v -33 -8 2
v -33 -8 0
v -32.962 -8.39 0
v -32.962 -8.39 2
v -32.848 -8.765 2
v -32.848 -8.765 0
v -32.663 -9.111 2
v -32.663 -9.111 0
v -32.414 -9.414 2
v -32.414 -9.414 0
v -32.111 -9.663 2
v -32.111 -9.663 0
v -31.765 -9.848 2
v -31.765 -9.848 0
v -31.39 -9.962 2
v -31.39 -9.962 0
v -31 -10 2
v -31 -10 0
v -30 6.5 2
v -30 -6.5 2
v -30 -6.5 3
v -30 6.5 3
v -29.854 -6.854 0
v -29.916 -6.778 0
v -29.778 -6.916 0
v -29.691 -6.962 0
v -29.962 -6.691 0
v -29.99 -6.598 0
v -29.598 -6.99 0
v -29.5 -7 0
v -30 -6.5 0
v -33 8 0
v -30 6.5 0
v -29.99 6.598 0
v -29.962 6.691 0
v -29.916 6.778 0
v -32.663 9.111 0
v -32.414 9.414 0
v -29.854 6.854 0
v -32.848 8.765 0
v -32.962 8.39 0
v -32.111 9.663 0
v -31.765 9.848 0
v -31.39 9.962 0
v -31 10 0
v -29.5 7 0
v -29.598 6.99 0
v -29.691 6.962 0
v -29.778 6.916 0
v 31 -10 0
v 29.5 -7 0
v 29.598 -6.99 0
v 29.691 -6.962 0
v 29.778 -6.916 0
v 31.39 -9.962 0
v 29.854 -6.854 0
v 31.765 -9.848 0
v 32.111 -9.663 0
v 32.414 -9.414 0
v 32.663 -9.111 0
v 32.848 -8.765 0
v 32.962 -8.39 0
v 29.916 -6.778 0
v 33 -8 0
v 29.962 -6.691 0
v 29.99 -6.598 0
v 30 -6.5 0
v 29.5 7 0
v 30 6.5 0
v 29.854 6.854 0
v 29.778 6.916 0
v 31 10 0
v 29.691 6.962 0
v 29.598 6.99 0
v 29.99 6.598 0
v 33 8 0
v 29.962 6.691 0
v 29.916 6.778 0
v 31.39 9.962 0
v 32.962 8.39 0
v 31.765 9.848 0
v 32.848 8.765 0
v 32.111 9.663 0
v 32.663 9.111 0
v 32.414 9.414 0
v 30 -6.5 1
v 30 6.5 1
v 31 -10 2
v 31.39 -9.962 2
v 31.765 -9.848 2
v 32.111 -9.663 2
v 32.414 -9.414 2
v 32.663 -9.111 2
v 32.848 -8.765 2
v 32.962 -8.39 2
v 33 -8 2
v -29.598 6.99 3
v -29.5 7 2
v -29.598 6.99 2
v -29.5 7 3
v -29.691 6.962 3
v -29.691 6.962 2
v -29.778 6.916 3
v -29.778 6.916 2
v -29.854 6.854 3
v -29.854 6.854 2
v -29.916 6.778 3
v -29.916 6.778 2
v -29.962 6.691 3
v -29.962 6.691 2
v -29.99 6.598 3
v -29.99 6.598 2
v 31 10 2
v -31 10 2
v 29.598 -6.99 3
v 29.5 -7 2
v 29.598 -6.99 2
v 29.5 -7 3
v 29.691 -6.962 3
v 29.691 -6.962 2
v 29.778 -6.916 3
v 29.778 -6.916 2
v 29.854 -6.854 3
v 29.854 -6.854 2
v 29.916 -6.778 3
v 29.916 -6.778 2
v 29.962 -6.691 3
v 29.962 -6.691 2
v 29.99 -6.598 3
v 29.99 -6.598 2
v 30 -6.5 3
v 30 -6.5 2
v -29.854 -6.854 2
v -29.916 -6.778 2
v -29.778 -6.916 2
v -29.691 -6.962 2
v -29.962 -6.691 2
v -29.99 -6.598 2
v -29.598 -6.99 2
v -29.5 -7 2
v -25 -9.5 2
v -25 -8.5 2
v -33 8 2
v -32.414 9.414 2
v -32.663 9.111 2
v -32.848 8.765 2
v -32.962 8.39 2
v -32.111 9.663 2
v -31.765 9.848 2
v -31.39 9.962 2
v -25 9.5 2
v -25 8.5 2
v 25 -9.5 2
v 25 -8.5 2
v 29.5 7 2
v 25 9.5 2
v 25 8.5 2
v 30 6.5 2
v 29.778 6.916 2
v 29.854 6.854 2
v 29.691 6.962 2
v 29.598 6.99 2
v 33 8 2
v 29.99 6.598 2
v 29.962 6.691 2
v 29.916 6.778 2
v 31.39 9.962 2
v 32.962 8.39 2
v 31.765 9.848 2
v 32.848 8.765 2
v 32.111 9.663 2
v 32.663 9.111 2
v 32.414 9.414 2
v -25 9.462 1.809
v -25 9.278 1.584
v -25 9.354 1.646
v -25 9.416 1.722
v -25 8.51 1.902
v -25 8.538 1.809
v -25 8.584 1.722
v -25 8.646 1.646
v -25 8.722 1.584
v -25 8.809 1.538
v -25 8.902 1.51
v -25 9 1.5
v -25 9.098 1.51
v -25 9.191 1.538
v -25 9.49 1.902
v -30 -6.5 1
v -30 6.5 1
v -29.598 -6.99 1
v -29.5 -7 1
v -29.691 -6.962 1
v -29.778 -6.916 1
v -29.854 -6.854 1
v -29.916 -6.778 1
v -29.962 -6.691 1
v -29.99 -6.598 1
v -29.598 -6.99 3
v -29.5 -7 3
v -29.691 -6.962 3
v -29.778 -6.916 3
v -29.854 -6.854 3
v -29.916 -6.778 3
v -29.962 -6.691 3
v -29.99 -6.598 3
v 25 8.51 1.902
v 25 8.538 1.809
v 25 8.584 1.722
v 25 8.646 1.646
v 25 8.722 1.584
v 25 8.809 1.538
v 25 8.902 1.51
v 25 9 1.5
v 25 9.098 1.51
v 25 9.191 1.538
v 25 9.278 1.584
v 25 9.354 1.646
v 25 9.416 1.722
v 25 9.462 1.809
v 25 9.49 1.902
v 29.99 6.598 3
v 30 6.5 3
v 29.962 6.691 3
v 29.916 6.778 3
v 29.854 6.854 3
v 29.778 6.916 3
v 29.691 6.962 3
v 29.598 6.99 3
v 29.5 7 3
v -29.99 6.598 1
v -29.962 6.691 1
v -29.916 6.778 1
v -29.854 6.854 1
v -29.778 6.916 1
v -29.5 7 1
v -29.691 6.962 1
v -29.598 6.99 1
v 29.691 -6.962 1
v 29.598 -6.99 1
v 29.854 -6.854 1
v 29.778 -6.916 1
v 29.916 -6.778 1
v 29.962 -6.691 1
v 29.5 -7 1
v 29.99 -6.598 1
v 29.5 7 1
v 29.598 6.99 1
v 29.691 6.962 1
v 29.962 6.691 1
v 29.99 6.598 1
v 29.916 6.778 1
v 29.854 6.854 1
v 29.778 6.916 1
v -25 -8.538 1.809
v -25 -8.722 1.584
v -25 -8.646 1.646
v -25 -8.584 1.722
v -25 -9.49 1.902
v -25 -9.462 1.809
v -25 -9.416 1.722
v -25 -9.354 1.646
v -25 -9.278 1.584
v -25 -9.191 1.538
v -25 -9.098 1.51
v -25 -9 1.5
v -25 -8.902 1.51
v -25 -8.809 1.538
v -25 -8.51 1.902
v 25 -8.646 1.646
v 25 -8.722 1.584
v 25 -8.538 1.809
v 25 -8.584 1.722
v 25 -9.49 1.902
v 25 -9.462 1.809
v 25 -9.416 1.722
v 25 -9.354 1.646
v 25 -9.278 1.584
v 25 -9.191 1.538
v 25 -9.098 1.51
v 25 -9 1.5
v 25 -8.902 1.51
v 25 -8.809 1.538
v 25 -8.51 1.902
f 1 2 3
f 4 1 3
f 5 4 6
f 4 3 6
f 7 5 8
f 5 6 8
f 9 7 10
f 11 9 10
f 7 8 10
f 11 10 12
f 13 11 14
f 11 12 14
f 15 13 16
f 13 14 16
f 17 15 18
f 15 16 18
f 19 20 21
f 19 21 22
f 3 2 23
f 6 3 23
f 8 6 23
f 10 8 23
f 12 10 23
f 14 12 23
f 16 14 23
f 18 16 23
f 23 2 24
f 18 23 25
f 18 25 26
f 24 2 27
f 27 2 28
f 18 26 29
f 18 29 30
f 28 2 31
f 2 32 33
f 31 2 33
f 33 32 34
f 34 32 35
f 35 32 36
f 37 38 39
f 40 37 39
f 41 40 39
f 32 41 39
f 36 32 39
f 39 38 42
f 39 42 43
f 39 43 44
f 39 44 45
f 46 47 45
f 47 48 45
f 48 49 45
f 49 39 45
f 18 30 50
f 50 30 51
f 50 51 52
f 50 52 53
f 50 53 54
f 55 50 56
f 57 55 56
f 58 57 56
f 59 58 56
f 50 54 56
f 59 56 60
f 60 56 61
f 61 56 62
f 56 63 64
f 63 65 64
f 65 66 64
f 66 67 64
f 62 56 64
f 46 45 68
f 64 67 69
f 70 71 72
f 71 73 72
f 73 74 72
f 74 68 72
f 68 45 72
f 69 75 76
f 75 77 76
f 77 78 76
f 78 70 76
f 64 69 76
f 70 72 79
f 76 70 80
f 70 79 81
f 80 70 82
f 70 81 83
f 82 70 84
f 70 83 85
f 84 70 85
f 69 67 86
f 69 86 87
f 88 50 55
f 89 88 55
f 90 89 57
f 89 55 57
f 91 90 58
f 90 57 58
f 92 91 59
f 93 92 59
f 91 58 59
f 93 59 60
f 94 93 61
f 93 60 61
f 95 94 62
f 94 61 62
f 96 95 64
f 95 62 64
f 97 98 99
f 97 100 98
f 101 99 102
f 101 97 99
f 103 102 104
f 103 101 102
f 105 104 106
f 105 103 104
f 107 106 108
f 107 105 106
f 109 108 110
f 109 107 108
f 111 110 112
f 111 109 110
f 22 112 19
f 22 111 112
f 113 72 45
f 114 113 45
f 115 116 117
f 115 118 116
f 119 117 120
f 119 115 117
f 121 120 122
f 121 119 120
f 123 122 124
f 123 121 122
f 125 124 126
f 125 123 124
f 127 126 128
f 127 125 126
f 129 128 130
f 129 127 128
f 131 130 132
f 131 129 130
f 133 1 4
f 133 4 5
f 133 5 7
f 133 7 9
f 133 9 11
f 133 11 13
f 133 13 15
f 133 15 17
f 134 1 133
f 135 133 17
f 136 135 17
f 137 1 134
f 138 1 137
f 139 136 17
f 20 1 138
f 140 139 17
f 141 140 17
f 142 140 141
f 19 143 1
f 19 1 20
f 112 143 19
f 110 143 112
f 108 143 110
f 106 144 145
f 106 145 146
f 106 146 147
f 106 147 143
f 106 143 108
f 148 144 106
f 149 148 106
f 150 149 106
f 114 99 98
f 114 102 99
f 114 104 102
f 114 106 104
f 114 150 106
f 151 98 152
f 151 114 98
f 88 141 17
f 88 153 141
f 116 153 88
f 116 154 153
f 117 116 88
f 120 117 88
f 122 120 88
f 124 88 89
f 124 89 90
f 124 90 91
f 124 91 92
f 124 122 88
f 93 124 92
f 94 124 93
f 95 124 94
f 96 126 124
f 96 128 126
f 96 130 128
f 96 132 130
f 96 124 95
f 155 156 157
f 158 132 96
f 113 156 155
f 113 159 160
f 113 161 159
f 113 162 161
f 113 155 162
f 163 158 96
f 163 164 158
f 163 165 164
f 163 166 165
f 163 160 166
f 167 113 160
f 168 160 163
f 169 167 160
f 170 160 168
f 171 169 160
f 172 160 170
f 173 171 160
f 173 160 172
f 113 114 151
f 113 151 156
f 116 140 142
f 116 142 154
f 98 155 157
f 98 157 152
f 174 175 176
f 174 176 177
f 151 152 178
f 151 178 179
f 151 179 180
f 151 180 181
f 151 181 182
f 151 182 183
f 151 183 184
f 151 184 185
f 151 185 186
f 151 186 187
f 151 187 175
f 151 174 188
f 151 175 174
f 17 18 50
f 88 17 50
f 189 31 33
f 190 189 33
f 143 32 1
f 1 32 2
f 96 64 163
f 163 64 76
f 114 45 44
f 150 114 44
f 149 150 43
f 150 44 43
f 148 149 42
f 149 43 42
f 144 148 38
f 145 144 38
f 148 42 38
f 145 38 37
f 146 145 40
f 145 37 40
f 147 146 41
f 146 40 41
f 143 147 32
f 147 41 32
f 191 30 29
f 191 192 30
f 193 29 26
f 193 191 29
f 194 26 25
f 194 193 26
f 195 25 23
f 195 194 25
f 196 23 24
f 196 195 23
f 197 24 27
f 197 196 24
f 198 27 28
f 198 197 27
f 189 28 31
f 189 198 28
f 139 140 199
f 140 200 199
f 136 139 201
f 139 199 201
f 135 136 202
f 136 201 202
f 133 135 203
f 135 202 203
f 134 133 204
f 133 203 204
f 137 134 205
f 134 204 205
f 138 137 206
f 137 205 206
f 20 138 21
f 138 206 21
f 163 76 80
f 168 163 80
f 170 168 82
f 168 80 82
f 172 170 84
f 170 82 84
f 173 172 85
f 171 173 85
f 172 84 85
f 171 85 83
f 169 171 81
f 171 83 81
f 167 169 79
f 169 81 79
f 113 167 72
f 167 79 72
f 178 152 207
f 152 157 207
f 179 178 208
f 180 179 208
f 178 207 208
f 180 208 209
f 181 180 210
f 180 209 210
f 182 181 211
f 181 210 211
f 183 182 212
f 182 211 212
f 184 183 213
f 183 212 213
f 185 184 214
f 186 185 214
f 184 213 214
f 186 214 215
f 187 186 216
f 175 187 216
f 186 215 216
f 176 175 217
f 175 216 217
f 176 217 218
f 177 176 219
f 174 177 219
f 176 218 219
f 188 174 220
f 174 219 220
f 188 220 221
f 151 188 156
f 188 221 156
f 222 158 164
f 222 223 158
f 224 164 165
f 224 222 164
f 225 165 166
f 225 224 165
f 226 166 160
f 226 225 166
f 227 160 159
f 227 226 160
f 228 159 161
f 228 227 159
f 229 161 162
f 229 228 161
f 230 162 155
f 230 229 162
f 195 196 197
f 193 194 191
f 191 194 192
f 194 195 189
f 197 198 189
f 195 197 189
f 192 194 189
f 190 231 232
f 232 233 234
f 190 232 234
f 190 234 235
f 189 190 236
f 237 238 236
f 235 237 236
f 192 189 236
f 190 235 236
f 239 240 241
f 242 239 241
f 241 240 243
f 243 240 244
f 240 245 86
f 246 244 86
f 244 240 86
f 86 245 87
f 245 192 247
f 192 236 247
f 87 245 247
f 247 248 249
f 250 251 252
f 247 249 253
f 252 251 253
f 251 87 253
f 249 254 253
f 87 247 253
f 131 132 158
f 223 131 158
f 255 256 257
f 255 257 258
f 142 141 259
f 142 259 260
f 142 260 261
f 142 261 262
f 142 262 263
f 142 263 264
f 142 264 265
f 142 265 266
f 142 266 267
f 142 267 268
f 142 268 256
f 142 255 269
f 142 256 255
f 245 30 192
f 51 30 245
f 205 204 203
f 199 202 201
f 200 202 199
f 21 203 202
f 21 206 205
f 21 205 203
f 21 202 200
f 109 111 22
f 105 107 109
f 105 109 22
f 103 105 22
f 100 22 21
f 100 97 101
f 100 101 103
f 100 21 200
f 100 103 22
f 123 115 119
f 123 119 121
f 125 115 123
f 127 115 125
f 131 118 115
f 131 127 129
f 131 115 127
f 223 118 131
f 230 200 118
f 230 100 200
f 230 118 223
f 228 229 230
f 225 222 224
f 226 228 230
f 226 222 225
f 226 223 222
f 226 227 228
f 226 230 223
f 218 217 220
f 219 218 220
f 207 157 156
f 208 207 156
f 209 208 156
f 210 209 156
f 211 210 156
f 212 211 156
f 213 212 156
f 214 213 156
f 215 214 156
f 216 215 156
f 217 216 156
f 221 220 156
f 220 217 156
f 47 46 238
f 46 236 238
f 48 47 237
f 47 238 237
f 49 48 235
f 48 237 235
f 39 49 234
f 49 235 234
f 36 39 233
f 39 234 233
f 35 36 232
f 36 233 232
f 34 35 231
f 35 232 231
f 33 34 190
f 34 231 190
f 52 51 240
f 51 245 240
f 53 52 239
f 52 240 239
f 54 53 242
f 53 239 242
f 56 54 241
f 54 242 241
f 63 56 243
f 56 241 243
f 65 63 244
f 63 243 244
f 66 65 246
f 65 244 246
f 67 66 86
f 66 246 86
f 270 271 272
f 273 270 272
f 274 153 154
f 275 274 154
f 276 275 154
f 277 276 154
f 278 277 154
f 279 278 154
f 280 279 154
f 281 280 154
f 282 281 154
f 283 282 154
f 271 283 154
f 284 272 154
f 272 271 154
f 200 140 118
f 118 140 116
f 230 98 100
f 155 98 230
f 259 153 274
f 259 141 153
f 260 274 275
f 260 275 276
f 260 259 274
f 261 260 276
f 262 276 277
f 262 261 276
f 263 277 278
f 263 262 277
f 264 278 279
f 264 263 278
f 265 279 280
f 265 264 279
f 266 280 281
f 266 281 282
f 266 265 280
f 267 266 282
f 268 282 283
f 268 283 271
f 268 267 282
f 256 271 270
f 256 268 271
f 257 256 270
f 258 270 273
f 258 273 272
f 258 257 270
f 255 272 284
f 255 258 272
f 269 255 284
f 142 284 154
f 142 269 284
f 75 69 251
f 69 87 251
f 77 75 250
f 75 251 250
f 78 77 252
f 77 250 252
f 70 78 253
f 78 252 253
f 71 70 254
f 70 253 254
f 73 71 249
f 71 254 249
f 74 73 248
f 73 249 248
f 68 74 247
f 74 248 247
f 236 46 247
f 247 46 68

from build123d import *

# Parameters (mm, degrees)
F0_W          = 60
F0_H          = 14
F1_DEPTH      = 2
F2_W          = 60
F2_H          = 14
F3_DEPTH      = 1
F3_DEPTH_BACK = 1
F4_R          = 0.5
F6_DEPTH      = 25
F7_R          = 0.5


with BuildPart() as f1:
    # F0 (on Top) → F1 (new body)
    with BuildSketch(Plane.XY):
        with BuildLine():
            Line((31, 10), (-31, 10))
            ThreePointArc((-31, 10), (-32.4142135624, 9.4142135624), (-33, 8))
            Line((-33, 8), (-33, -8))
            ThreePointArc((-33, -8), (-32.4142135624, -9.4142135624), (-31, -10))
            Line((-31, -10), (31, -10))
            ThreePointArc((31, -10), (32.4142135624, -9.4142135624), (33, -8))
            Line((33, -8), (33, 8))
            ThreePointArc((33, 8), (32.4142135624, 9.4142135624), (31, 10))
        make_face()
        Rectangle(F0_W, F0_H, mode=Mode.SUBTRACT)
    extrude(amount=F1_DEPTH)

    # F2 (on face) → F3 (join, two sides)
    with BuildSketch(Plane.XY.offset(2)) as f3_sk:
        Rectangle(F2_W, F2_H)
    extrude(amount=F3_DEPTH)
    extrude(f3_sk.sketch, amount=-F3_DEPTH_BACK)

    # F4
    f4_edges = [f1.edges().sort_by_distance(p)[0] for p in [
        (-30, 7, 2.5),
        (-30, -7, 2.5),
        (30, -7, 2.5),
        (30, 7, 2.5),
    ]]
    fillet(f4_edges, radius=F4_R)

    # F5 (on Right) → F6 (cut, symmetric)
    with BuildSketch(Plane.YZ):
        with BuildLine():
            Line((-8.5, 2), (-9.5, 2))
            ThreePointArc((-9.5, 2), (-9, 1.5), (-8.5, 2))
        make_face()
        with BuildLine():
            ThreePointArc((8.5, 2), (9, 1.5), (9.5, 2))
            Line((9.5, 2), (8.5, 2))
        make_face()
    extrude(amount=F6_DEPTH, both=True, mode=Mode.SUBTRACT)

    # F7
    f7_edges = [f1.edges().sort_by_distance(p)[0] for p in [
        (30, -7, 0.5),
        (30, 7, 0.5),
        (-30, -7, 0.5),
        (-30, 7, 0.5),
    ]]
    fillet(f7_edges, radius=F7_R)


solid = f1.part
